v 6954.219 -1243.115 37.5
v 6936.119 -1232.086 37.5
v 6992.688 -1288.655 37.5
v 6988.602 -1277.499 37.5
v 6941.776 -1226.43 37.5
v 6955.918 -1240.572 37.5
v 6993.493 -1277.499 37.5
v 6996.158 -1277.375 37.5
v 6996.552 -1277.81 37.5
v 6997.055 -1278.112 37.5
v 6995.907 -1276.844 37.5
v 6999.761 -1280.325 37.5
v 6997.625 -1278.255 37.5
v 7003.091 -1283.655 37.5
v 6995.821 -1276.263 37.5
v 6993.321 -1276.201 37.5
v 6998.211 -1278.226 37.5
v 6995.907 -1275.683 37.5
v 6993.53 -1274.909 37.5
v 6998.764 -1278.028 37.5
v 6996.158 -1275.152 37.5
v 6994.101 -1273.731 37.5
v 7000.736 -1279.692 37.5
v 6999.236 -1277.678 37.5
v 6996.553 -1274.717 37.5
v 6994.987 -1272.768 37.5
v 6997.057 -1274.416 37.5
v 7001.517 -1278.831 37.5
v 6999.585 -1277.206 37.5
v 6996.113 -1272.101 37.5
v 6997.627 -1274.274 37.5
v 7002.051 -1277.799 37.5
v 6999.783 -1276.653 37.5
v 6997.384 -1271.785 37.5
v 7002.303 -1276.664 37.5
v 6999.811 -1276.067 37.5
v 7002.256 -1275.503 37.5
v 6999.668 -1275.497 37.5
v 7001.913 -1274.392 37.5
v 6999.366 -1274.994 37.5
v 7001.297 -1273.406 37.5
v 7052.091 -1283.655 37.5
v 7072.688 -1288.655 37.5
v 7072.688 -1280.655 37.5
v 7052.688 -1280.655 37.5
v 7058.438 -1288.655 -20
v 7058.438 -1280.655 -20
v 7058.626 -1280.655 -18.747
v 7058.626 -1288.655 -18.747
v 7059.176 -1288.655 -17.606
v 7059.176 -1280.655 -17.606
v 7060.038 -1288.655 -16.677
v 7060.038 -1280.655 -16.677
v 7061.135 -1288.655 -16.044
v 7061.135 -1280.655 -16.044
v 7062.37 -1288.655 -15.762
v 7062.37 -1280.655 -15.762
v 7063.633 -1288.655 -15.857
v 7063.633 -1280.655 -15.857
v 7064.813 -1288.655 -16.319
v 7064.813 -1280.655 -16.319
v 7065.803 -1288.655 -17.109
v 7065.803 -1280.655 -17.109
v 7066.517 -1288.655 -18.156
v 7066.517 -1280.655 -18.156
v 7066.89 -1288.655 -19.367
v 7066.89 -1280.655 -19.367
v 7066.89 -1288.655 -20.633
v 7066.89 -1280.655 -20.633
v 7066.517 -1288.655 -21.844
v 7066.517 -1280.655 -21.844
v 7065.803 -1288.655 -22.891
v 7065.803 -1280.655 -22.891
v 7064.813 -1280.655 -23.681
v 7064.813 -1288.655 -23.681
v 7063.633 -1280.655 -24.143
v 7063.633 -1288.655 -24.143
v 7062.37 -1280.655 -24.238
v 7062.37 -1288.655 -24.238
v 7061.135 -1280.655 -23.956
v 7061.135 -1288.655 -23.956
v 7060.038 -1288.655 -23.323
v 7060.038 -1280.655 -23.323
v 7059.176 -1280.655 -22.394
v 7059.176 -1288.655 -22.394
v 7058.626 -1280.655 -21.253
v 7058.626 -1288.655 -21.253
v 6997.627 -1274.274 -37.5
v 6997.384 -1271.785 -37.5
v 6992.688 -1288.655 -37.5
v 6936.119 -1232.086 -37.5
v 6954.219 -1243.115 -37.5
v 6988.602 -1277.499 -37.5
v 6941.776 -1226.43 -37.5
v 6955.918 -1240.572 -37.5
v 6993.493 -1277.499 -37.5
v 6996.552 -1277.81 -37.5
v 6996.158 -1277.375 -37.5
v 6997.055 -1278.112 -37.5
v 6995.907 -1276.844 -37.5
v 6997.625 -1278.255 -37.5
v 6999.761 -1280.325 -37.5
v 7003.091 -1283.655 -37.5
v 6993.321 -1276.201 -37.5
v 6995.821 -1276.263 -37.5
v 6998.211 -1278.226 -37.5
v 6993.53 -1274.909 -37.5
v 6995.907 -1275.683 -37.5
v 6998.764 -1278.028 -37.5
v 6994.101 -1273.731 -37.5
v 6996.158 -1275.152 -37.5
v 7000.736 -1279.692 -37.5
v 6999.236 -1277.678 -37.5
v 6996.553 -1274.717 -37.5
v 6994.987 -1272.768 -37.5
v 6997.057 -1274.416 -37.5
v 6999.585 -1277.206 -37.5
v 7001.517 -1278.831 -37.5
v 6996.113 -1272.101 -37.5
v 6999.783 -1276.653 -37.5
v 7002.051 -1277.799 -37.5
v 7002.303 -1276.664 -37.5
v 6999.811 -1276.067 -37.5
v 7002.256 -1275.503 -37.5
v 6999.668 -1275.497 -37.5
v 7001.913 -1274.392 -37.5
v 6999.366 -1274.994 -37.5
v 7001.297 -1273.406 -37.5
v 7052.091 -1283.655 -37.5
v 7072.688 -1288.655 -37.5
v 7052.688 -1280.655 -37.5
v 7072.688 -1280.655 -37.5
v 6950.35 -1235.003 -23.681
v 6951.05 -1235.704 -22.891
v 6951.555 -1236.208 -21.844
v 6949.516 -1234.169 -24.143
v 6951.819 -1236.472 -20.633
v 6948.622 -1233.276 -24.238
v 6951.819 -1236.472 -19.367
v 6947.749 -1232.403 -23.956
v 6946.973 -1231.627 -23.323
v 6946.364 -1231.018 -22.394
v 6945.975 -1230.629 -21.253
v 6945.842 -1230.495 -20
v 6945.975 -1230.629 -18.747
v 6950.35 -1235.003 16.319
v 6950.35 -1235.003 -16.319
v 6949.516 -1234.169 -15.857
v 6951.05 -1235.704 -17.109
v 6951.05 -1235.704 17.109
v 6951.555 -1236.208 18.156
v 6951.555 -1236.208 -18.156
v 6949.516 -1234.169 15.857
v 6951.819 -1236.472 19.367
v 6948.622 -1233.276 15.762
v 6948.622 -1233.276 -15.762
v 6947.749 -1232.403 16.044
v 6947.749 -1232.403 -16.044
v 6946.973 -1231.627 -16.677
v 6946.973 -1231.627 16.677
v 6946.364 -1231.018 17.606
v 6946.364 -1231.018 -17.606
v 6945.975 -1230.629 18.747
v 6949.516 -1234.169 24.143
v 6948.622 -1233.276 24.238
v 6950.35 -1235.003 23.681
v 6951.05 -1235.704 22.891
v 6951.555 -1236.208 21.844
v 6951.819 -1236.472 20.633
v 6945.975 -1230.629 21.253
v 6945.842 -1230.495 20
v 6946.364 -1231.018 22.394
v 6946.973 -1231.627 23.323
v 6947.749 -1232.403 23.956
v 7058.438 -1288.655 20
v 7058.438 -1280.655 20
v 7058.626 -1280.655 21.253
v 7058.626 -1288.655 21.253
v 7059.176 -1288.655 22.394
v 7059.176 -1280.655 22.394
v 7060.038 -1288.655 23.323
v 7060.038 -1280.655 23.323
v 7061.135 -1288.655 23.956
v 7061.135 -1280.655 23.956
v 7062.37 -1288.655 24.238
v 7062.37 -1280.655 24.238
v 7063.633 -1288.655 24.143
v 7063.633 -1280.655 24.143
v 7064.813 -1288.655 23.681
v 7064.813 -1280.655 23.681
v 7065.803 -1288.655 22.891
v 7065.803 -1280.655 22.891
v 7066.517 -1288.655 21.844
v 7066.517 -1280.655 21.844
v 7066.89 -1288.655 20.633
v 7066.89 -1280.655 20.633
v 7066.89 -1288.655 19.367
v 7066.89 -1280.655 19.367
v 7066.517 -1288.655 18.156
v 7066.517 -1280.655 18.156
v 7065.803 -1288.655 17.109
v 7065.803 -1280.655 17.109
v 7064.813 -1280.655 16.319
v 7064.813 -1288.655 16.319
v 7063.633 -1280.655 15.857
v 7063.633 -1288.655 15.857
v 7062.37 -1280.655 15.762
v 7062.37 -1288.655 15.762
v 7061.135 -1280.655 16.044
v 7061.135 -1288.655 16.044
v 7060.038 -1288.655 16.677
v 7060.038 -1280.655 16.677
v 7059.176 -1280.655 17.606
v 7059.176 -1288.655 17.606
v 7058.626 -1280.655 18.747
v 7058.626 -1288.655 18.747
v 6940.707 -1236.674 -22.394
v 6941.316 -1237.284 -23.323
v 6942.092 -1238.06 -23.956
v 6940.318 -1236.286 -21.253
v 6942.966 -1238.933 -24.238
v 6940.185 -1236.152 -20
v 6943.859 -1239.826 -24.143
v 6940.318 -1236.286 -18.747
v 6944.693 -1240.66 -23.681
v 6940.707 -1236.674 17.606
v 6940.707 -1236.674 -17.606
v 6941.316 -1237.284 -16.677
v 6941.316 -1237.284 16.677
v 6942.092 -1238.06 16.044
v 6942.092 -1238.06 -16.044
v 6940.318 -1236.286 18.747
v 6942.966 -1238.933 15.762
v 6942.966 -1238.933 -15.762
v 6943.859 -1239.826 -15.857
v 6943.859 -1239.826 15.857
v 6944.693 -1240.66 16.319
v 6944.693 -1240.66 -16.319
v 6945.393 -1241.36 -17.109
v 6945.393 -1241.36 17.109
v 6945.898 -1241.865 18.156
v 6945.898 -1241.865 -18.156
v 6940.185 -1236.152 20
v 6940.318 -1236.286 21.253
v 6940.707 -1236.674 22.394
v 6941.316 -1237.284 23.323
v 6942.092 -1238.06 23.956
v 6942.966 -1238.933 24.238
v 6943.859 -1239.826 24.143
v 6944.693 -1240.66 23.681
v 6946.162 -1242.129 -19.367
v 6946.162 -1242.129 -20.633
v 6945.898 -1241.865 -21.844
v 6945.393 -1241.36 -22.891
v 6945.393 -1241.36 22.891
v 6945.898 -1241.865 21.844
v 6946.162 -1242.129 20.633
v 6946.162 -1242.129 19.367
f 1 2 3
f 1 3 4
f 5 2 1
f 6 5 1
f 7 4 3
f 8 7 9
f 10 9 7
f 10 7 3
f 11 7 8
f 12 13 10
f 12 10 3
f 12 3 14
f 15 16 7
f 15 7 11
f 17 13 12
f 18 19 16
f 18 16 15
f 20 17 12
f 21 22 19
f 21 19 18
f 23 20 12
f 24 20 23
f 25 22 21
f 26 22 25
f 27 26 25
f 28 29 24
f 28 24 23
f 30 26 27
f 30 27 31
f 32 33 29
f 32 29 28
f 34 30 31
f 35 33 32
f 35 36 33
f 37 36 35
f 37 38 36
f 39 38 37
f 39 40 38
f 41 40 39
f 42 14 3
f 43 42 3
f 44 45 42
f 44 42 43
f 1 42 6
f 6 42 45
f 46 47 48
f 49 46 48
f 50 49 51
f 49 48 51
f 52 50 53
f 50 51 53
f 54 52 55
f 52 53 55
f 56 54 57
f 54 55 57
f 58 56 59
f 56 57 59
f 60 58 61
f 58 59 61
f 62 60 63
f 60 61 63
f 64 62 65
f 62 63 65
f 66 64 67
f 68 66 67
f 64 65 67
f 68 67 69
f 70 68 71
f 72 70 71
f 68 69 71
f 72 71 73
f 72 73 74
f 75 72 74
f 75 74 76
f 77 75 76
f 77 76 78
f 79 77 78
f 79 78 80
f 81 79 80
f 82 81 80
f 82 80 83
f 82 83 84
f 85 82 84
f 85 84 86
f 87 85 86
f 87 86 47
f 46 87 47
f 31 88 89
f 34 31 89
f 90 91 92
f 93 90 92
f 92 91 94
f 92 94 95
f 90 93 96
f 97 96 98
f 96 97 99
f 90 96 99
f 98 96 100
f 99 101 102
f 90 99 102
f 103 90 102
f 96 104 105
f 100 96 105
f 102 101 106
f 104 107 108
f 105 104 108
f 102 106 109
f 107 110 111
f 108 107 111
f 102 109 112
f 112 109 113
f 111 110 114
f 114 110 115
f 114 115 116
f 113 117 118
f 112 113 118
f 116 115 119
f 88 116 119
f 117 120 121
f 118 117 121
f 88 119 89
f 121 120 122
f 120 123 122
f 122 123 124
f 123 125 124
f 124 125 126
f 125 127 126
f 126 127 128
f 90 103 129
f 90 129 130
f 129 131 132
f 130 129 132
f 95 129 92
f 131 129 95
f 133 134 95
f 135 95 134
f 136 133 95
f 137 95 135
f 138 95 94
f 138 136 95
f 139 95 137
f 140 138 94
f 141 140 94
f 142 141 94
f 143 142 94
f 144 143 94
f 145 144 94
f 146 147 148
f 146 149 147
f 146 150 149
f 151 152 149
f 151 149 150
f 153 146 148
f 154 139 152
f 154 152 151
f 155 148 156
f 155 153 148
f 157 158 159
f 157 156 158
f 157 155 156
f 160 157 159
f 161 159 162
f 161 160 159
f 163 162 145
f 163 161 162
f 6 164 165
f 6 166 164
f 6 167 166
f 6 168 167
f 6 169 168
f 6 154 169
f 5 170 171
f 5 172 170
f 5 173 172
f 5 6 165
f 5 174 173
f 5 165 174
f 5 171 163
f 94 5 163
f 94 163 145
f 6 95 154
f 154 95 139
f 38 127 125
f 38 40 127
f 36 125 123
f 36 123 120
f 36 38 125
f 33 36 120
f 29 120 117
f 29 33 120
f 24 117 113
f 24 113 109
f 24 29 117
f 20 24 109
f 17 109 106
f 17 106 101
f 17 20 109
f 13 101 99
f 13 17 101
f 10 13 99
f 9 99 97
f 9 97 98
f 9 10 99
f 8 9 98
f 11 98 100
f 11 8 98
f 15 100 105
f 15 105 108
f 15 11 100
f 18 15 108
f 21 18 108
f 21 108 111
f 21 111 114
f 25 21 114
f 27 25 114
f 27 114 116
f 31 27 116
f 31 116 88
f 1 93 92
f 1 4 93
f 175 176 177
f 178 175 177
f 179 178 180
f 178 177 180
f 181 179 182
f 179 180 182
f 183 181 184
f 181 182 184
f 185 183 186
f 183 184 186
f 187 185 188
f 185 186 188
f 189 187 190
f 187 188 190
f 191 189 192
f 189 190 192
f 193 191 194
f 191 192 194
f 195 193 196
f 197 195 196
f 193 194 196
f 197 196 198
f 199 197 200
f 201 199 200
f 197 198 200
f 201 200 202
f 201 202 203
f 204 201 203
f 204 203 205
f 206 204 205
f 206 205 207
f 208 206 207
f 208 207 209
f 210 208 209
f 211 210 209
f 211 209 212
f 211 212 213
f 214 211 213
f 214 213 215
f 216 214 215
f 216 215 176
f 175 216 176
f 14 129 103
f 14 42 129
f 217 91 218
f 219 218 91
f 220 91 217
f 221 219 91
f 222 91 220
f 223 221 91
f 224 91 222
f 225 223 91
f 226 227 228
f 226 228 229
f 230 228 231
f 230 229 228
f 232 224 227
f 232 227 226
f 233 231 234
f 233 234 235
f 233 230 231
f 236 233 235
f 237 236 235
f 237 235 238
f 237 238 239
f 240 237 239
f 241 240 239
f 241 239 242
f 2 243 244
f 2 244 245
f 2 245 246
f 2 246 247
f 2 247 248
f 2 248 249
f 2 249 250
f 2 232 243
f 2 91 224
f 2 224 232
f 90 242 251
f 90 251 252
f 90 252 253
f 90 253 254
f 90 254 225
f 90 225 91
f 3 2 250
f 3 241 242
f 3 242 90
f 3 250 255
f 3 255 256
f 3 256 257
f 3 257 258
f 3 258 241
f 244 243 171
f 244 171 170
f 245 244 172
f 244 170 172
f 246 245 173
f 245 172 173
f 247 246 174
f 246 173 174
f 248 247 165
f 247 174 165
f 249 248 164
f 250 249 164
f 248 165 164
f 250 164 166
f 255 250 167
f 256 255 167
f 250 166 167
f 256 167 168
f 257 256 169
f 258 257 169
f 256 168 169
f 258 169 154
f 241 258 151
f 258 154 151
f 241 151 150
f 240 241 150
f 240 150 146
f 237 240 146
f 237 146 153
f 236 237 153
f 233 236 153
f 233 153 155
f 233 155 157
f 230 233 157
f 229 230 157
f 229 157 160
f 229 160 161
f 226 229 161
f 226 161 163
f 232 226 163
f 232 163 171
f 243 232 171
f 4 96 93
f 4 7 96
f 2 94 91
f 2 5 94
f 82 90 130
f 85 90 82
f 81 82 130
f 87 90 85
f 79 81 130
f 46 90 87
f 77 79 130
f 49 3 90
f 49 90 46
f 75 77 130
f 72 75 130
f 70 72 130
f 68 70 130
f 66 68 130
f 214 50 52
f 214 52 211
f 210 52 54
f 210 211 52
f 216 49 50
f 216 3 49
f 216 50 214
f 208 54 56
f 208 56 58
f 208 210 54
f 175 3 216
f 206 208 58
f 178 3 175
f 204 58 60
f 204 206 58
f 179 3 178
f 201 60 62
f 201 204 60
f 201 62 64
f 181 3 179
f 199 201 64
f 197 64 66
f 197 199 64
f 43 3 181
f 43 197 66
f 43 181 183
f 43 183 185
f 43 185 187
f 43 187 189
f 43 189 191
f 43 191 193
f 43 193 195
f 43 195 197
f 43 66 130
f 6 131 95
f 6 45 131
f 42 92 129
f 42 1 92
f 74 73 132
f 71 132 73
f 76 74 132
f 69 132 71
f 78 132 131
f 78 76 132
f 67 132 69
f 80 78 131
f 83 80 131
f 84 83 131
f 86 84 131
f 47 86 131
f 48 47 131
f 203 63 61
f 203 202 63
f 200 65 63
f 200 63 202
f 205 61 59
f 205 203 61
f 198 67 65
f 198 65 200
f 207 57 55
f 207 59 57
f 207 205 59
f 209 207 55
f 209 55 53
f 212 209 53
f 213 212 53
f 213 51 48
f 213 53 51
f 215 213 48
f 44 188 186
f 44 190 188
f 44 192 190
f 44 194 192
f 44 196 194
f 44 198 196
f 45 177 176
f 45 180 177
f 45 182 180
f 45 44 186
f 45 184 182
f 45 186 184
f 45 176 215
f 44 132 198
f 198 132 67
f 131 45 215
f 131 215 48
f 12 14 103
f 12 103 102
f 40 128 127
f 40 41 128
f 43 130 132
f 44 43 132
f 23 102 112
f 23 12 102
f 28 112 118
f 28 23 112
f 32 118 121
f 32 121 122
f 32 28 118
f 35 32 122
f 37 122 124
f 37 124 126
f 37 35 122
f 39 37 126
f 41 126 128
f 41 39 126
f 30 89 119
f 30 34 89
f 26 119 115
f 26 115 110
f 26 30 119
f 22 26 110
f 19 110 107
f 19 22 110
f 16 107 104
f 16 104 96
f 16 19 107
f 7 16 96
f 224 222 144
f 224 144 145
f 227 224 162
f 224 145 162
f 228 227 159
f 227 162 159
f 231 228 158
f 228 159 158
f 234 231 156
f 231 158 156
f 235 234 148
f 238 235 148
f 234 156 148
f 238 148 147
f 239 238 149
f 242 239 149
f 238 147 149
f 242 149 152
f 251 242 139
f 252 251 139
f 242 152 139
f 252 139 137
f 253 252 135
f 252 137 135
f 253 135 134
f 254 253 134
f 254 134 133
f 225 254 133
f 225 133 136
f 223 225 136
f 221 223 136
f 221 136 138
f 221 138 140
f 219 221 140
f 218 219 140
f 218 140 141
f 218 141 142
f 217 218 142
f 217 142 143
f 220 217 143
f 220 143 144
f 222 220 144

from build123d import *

# Parameters (mm, degrees)
EXTRUDE_1_DEPTH         = 37.5
HOLE_WIZARD_8_5_8_5_1_D = 8.5
HOLE_WIZARD_8_5_8_5_2_D = 8.5


with BuildPart() as part:
    # 草图1 → 凸台-拉伸1 (new, symmetric)
    with BuildSketch(Plane.XY):
        Polygon((6936.119122288, -1232.086390659), (6992.687664783, -1288.654933154), (7072.687664783, -1288.654933154), (7072.687664783, -1280.654933154), (7052.687664783, -1280.654933154), (6955.918112162, -1240.571672033), (6941.775976538, -1226.429536409), align=None)
        with BuildLine():
            Line((7009.090927681, -1283.654933154), (7003.090927681, -1283.654933154))
            Line((7003.090927681, -1283.654933154), (6999.760549745, -1280.324555218))
            ThreePointArc((6999.760549745, -1280.324555218), (7002.213755914, -1277.239517812), (7001.296666197, -1273.406161221))
            Line((7001.296666197, -1273.406161221), (6999.365595427, -1274.993916141))
            ThreePointArc((6999.365595427, -1274.993916141), (6997.055371947, -1278.111879141), (6997.626530039, -1274.273571671))
            Line((6997.626530039, -1274.273571671), (6997.383769074, -1271.785386165))
            ThreePointArc((6997.383769074, -1271.785386165), (6994.101203016, -1273.731324494), (6993.49338103, -1277.49861375))
            Line((6993.49338103, -1277.49861375), (6988.602413191, -1277.49861375))
            Line((6988.602413191, -1277.49861375), (6954.21874867, -1243.114949228))
            Line((6954.21874867, -1243.114949228), (7052.090927681, -1283.654933154))
            Line((7052.090927681, -1283.654933154), (7029.403393536, -1283.654933154))
            Line((7029.403393536, -1283.654933154), (7009.090927681, -1283.654933154))
        make_face(mode=Mode.SUBTRACT)
    extrude(amount=EXTRUDE_1_DEPTH, both=True)

    # Ø8.5 (8.5) 直径孔1 (through all)
    with Locations(Plane(origin=(2852.016365815, 2852.016365815, 0), x_dir=(0.7071067811865628, -0.7071067811865324, 0), z_dir=(-0.7071067811865324, -0.7071067811865628, 0))):
        with Locations((5785.79350833, -20), (5785.79350833, 20)):
            Hole(HOLE_WIZARD_8_5_8_5_1_D / 2)

    # Ø8.5 (8.5) 直径孔2 (through all)
    with Locations(Plane.XZ.offset(1288.654933154)):
        with Locations((7062.687664783, -20), (7062.687664783, 20)):
            Hole(HOLE_WIZARD_8_5_8_5_2_D / 2)


solid = part.part
